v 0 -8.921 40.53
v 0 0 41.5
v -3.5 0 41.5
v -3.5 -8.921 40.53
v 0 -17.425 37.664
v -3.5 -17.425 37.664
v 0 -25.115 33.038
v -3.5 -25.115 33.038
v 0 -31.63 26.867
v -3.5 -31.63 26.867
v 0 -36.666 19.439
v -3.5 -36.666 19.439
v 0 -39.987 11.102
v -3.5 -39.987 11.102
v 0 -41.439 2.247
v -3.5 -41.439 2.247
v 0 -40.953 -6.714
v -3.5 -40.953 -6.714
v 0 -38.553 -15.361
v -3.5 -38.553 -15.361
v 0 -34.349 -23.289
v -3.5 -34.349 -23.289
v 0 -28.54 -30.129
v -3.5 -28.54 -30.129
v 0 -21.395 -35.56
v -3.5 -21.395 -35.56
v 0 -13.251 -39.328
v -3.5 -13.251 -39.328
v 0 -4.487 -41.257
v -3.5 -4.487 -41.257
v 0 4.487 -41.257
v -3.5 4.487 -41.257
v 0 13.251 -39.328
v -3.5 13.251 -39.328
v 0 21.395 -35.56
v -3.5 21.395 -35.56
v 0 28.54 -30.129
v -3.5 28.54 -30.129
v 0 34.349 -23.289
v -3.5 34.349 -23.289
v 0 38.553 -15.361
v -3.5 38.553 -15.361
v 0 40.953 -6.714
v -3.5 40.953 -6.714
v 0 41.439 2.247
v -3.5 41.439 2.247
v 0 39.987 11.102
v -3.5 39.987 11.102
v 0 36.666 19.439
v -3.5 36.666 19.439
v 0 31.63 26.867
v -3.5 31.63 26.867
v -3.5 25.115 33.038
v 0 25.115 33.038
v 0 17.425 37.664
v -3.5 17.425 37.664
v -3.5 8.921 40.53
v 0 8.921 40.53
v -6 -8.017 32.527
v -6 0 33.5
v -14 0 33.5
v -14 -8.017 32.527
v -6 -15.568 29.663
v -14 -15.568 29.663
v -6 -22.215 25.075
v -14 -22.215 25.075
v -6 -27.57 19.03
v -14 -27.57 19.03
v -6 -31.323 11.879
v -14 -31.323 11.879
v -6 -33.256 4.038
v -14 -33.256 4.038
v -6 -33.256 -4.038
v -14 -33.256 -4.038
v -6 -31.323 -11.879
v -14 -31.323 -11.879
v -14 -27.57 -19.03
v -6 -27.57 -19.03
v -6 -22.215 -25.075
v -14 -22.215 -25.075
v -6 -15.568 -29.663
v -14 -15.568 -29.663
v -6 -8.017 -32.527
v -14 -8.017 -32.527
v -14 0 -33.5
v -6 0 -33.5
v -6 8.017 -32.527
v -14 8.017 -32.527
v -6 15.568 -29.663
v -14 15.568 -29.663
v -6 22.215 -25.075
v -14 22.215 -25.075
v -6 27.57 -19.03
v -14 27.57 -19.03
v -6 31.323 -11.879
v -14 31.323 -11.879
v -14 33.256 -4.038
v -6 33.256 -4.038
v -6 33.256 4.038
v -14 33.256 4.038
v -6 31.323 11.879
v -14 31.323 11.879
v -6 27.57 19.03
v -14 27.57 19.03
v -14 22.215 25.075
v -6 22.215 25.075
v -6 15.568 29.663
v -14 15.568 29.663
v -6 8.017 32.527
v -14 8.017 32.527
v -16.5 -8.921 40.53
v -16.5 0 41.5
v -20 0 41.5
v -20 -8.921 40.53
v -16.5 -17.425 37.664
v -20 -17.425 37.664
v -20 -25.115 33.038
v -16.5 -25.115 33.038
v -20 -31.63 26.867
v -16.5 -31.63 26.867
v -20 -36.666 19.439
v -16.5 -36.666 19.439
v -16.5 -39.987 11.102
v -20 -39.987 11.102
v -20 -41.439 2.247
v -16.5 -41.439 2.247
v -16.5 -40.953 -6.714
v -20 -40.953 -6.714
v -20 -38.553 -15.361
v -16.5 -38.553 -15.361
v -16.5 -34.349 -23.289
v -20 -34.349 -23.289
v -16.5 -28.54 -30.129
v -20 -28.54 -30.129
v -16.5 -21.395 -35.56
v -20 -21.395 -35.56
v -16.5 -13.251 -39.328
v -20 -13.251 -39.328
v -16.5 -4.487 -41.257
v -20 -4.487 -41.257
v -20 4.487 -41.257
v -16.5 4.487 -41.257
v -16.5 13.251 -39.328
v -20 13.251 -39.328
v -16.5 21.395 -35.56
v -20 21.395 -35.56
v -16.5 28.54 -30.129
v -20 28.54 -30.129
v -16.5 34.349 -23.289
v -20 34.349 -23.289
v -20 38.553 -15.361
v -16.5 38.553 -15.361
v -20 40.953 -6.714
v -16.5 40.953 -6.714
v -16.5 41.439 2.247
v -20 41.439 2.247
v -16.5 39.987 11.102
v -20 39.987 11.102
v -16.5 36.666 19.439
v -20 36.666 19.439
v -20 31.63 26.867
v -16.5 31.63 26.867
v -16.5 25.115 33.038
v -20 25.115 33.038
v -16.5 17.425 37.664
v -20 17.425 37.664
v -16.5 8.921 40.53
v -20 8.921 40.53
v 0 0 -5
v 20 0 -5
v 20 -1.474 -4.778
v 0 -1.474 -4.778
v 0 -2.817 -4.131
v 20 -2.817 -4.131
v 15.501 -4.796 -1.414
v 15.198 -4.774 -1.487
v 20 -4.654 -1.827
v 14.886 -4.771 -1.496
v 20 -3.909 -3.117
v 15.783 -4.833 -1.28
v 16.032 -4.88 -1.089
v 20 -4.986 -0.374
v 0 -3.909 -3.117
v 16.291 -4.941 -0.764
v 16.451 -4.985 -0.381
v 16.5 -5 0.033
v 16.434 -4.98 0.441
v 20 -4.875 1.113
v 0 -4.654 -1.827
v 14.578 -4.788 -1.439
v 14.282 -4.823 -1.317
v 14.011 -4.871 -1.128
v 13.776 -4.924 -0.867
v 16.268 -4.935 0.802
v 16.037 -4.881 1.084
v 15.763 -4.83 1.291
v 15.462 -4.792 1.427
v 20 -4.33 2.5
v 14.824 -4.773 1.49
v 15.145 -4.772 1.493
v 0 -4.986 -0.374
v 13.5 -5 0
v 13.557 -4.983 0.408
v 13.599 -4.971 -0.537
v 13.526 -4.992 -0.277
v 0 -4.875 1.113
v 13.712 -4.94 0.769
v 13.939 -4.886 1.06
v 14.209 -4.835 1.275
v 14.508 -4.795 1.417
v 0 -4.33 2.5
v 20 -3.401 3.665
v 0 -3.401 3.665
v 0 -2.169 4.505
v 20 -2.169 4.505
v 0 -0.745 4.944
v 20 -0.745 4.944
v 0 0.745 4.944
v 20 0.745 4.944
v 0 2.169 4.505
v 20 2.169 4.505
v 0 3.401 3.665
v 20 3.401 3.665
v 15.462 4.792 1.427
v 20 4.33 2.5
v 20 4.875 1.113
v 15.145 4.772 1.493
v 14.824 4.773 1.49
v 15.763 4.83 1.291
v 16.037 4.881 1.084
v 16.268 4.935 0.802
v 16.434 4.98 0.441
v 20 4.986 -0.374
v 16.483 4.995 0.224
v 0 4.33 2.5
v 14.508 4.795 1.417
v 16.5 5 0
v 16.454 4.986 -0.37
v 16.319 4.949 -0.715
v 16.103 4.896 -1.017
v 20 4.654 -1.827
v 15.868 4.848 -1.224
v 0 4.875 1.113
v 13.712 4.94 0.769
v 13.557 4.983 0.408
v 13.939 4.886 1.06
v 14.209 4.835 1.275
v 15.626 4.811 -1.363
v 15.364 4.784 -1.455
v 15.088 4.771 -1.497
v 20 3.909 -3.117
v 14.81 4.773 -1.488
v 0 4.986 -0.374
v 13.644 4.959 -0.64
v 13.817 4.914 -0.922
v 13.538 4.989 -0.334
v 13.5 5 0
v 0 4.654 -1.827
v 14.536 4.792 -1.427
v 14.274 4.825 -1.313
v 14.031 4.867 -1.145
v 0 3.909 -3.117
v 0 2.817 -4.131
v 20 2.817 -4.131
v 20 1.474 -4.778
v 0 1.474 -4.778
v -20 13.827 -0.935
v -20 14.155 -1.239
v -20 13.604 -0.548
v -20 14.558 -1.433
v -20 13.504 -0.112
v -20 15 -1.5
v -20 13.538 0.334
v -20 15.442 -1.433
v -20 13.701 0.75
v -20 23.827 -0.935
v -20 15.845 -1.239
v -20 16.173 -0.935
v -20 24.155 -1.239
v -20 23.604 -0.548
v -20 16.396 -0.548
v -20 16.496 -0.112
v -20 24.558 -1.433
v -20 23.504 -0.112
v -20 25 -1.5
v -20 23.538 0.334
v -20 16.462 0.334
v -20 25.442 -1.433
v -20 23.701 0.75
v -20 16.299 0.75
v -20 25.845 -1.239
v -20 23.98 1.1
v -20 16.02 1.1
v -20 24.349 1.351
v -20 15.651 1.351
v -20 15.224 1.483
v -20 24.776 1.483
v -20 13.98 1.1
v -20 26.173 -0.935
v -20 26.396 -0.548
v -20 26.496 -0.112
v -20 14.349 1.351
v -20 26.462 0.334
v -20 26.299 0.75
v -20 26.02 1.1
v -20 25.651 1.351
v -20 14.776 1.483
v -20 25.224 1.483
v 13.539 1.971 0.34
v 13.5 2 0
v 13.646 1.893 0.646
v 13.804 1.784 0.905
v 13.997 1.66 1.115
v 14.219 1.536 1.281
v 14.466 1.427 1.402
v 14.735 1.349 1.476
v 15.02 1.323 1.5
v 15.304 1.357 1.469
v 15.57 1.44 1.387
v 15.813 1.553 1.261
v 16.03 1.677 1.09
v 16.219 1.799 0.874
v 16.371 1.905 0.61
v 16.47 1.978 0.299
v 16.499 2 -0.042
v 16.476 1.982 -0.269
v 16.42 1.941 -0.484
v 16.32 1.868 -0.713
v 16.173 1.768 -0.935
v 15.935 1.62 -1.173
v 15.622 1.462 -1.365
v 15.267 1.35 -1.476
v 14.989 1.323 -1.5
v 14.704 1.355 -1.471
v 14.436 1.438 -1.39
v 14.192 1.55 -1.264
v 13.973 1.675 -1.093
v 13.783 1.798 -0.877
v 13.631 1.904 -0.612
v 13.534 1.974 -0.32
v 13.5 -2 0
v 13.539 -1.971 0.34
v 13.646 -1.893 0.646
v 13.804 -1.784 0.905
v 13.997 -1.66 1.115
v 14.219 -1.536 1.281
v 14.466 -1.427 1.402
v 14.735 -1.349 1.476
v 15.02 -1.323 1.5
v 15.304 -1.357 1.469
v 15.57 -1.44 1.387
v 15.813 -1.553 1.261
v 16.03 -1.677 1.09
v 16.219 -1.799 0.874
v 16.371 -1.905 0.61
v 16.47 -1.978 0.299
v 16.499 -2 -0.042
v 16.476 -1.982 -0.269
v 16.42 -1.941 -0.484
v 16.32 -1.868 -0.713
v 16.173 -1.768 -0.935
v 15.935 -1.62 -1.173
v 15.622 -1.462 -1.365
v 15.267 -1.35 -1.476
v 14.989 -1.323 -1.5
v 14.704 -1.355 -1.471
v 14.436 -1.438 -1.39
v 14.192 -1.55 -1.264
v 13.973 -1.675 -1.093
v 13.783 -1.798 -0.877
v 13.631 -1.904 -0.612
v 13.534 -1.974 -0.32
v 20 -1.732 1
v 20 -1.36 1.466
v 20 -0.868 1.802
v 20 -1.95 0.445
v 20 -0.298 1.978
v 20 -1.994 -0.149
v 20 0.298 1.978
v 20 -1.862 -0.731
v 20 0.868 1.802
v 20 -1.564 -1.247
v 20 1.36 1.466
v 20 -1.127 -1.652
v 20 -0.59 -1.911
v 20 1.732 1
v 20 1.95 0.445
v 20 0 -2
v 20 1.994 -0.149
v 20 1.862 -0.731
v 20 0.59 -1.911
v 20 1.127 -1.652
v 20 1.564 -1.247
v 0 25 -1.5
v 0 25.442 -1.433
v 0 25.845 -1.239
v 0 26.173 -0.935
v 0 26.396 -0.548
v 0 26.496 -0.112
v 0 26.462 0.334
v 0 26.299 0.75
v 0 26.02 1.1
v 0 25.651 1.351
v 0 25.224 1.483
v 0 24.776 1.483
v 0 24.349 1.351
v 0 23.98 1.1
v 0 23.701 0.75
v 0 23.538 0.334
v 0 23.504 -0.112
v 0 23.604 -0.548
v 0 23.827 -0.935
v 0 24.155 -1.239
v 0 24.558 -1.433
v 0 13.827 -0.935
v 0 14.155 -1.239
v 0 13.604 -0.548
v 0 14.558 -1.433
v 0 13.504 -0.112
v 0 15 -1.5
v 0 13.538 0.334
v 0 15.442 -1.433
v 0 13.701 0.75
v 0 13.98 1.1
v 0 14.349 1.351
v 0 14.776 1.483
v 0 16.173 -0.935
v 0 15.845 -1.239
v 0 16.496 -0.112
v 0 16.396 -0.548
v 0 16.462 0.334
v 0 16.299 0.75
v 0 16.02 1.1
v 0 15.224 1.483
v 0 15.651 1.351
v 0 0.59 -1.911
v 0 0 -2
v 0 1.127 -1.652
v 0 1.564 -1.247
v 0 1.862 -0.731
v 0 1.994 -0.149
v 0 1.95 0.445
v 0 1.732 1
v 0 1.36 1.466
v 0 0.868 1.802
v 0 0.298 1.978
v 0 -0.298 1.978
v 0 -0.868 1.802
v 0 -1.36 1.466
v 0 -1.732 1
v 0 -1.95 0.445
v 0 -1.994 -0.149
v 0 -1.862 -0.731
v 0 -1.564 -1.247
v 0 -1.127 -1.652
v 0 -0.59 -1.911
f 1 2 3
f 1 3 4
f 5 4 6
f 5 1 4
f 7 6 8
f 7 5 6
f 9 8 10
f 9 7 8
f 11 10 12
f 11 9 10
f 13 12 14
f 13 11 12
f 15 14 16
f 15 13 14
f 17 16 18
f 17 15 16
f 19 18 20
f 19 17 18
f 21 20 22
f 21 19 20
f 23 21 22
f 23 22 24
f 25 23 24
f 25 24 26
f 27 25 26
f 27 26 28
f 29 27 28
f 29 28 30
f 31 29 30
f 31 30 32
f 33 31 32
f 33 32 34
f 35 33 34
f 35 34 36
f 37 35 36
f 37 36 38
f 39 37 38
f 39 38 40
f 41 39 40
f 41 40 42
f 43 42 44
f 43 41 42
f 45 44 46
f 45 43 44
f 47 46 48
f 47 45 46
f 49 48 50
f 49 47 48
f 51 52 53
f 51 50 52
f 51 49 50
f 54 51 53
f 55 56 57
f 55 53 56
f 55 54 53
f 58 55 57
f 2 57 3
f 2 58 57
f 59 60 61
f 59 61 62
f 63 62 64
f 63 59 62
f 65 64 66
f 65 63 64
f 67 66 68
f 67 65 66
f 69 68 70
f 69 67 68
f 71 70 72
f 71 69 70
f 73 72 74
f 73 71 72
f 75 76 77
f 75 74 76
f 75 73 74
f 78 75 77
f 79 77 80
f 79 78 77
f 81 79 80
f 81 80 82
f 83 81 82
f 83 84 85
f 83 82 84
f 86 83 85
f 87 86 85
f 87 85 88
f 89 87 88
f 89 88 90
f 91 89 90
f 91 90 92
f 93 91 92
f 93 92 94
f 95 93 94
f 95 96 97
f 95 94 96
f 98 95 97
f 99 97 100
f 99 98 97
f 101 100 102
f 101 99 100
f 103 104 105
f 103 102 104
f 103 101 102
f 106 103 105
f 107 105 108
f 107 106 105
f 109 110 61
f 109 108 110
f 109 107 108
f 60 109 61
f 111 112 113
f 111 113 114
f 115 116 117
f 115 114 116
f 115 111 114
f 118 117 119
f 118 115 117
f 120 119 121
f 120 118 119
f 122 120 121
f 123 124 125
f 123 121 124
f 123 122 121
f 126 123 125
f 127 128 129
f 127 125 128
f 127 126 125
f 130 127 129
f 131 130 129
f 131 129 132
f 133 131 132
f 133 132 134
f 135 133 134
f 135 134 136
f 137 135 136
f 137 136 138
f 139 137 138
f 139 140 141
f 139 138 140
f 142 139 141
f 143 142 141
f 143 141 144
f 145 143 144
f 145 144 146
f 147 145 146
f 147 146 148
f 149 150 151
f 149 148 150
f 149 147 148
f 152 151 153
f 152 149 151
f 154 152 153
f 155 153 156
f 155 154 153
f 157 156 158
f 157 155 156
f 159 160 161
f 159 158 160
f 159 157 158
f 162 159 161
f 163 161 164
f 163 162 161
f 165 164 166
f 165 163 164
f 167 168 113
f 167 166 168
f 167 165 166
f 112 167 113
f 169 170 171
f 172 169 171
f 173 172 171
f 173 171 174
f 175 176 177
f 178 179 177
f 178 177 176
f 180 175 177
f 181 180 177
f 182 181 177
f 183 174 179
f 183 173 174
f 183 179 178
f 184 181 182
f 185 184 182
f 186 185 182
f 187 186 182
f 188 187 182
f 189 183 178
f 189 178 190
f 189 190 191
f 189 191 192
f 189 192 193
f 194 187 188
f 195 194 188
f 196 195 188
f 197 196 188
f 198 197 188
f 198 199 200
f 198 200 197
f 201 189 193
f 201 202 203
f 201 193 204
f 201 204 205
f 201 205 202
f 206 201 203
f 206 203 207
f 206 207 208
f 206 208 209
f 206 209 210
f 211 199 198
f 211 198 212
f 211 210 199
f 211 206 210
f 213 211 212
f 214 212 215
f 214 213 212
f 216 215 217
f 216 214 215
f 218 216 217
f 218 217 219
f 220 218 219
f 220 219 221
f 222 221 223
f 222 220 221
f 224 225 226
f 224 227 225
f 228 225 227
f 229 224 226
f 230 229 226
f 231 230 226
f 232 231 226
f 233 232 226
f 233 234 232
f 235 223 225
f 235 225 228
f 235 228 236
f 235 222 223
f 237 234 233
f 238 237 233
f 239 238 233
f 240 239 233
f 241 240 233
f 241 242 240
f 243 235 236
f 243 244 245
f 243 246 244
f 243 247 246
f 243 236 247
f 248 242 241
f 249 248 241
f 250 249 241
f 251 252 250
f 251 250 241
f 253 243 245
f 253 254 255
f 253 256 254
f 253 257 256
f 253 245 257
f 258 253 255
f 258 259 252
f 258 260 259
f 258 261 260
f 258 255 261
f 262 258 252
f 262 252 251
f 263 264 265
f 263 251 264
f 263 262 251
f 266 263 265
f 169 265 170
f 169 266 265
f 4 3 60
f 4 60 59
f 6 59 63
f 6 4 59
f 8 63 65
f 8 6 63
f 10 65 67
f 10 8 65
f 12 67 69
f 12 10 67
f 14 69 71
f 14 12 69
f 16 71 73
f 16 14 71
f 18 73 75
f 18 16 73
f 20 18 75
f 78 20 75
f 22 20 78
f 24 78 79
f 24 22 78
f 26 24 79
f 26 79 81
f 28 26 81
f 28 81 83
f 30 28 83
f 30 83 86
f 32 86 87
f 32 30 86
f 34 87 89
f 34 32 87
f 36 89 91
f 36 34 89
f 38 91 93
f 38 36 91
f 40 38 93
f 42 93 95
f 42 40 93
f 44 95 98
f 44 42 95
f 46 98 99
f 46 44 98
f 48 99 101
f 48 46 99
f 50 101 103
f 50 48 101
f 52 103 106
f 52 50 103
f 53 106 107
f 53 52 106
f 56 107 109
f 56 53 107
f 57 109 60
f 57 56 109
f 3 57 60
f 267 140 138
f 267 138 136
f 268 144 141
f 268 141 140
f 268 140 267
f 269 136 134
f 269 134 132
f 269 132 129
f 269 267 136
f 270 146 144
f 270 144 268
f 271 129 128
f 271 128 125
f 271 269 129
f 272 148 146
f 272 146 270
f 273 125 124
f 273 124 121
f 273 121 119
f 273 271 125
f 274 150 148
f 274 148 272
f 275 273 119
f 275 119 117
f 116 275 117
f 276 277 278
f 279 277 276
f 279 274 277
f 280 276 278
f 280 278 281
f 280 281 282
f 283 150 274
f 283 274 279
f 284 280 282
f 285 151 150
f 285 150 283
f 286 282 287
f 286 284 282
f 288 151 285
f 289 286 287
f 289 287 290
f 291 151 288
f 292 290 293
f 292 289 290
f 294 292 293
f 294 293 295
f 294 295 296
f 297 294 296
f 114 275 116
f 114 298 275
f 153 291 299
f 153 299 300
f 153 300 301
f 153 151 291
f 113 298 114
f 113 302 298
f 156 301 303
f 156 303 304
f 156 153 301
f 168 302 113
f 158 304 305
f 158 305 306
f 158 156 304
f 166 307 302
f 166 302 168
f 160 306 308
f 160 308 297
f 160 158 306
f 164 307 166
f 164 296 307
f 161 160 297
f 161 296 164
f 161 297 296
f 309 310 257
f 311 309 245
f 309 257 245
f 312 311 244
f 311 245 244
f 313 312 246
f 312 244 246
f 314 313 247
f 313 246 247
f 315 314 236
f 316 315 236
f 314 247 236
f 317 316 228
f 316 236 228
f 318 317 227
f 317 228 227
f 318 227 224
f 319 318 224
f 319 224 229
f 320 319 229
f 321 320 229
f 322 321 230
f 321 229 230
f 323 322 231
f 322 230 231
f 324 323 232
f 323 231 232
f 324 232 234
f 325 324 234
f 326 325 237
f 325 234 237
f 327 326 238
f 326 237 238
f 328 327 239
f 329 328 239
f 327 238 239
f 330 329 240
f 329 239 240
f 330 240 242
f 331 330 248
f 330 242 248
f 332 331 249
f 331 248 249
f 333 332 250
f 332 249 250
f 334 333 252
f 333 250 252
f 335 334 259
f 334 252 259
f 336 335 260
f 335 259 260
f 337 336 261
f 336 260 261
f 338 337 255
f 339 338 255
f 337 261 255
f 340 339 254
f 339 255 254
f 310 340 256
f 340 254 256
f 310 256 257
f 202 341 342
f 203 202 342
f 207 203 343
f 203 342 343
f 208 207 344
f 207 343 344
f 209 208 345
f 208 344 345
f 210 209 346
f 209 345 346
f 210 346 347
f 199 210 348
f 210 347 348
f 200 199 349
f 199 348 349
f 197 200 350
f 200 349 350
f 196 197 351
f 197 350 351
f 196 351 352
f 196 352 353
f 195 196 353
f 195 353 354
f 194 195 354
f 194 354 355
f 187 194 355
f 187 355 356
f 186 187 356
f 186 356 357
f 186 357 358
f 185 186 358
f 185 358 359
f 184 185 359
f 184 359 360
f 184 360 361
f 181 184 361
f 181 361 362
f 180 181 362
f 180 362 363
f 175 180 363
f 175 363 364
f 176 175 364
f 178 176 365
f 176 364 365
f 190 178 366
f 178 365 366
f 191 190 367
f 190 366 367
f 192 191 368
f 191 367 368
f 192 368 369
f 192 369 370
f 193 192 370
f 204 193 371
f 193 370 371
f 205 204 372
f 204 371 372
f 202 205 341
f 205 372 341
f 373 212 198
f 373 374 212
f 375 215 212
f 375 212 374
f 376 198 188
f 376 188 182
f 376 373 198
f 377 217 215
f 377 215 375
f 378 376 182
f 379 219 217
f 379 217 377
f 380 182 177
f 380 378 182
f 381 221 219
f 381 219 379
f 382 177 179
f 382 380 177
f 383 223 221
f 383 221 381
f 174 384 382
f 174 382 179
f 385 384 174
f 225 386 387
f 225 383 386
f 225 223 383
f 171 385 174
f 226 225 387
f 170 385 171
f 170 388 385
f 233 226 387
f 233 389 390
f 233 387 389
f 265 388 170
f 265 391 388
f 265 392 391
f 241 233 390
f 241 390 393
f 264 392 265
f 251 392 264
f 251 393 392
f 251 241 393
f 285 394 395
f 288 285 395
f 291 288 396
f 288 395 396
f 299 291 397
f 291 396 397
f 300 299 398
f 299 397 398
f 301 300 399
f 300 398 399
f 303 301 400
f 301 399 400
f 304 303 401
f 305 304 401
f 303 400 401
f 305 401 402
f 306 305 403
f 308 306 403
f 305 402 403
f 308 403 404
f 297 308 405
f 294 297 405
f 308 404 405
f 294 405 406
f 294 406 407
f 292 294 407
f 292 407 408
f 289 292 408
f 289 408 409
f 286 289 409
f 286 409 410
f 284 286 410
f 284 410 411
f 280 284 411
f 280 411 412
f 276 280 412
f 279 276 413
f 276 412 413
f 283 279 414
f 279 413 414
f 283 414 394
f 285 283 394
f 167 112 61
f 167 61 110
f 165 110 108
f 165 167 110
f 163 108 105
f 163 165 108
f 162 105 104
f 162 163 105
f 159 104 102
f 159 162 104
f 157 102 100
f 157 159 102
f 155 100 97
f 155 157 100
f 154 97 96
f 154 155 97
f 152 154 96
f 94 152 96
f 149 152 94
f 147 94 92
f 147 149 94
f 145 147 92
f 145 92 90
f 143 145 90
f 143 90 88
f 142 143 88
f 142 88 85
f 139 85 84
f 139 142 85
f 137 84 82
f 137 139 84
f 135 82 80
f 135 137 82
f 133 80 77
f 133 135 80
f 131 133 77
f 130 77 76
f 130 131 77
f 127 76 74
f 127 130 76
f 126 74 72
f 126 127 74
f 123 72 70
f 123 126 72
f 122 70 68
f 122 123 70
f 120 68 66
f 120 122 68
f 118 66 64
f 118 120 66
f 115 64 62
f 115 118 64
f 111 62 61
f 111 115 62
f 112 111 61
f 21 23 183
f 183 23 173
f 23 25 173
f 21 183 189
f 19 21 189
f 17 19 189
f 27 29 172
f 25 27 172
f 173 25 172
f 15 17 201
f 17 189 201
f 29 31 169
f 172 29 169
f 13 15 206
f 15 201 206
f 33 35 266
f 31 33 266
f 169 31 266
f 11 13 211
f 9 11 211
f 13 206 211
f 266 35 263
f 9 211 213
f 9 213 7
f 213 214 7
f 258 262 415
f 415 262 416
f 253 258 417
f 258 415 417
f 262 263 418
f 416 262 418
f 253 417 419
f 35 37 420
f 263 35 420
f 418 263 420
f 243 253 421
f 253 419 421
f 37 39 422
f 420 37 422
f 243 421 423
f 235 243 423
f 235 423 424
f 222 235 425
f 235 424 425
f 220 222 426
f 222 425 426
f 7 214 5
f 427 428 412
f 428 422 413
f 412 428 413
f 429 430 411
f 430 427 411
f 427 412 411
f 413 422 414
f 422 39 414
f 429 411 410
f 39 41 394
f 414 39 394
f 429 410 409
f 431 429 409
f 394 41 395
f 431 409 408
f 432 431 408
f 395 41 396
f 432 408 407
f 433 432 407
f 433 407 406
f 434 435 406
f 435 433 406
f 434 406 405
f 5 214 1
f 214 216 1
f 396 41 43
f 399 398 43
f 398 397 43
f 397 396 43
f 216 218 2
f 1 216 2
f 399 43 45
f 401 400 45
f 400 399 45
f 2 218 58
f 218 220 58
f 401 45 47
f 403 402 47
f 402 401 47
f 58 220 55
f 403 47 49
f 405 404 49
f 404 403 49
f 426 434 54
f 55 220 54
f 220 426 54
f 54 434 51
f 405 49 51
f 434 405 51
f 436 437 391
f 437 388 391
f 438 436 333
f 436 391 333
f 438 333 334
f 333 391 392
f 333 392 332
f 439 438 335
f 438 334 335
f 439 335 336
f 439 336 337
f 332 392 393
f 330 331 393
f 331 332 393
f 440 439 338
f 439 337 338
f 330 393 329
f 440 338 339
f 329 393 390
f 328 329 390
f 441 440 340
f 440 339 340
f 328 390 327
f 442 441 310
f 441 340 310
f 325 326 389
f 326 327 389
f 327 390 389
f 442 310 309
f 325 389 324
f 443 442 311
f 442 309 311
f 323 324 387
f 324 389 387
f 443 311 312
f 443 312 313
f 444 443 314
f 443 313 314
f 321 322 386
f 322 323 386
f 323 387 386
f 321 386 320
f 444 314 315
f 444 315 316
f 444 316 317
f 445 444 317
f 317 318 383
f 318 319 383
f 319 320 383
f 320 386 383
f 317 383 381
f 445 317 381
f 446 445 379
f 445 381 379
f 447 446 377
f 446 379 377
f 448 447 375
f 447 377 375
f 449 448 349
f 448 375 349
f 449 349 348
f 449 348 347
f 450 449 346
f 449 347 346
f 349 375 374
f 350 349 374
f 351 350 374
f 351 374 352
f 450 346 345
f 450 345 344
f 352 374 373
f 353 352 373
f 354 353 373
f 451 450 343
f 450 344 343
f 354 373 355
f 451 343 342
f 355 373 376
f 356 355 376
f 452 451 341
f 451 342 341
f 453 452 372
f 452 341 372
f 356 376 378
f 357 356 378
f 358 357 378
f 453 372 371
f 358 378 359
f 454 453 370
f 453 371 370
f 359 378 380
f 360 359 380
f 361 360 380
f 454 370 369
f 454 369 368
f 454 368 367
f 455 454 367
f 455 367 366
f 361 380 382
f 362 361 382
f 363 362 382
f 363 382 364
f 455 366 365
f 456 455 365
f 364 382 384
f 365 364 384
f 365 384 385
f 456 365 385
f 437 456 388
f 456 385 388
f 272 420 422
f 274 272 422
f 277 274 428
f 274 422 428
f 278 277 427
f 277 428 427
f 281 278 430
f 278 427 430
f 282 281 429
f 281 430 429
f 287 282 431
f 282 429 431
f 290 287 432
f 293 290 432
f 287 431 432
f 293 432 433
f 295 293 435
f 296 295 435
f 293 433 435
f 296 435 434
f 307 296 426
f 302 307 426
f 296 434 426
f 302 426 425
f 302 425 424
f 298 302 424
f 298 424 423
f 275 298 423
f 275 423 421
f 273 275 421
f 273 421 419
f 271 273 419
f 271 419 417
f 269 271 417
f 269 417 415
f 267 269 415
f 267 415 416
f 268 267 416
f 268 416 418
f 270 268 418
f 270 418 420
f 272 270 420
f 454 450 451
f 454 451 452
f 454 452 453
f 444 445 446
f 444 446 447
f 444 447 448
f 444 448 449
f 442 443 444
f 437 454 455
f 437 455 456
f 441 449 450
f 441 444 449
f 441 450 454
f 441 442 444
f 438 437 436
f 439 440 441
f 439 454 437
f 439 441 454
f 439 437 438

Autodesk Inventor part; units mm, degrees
ref_plane "YZ Plane" through (0, 0, 0) normal (1, 0, 0) x (0, 1, 0)
sketch "Эскиз1" plane through (0, 0, 0) normal (0, 1, 0) x (-1, 0, 0)
  line L0 (0, 0) -> (20, 0)
  line L1 (20, 0) -> (20, 41.5)
  line L2 (20, 41.5) -> (0, 41.5)
  line L3 (0, 41.5) -> (0, 0)
  line L4 (20, 41.5) -> (14, 41.5)
  line L5 (14, 41.5) -> (14, 33.5)
  line L6 (14, 33.5) -> (6, 33.5)
  line L7 (6, 33.5) -> (6, 41.5)
  line L8 (10, 33.5) -> (10, 41.5)
  line L9 (10, 41.5) -> (3.5, 41.5)
  line L10 (3.5, 41.5) -> (6, 33.5)
  line L11 (10, 41.5) -> (16.5, 41.5)
  line L12 (16.5, 41.5) -> (14, 33.5)
  dimension "d0" = 20
  dimension "d1" = 41.5
  dimension "d2" = 6
  dimension "d3" = 8
  dimension "d4" = 8
  dimension "d38" = 6.5
  dimension "d39" = 6.5
revolve "Вращение1" add sketch "Эскиз1" angle 360 about axis through (0, 0, 0) along (-1, 0, 0) contours L3 L2 L10 L6 L12 L1 L0
sketch "Эскиз2" plane through (0, 0, 0) normal (1, 0, 0) x (0, 0, -1)
  circle A0 centre (0, 0) radius 5
  dimension "d6" = 10
extrude "Выдавливание1" add sketch "Эскиз2" along normal blind 20
sketch "Эскиз3" plane through (20, 0, 0) normal (1, 0, 0) x (0, 0, -1)
  circle A0 centre (0, 0) radius 2
  dimension "d9" = 4
extrude "Выдавливание2" cut sketch "Эскиз3" against normal blind 20
sketch "Эскиз4" plane through (0, 0, 0) normal (1, 0, 0) x (0, 0, -1)
  circle A0 centre (0, 0) radius 5 projected
  point P0 (0, 5)
ref_plane "РабПлоскость1" through (0, 5, 0) normal (0, 1, 0) x (-1, 0, 0)
sketch "Эскиз5" plane through (0, 5, 0) normal (0, 1, 0) x (-1, 0, 0)
  line L0 (0, 0) -> (-15, 0)
  circle A0 centre (-15, 0) radius 1.5
  dimension "d18" = 15
  dimension "d19" = 3
extrude "Выдавливание3" cut sketch "Эскиз5" against normal blind 58
thread "Резьба1" size "M3x0.5" class "6H" standard "ISO Metric profile" full length
ref_plane "РабПлоскость2" through (-10, 0, 0) normal (-1, 0, 0) x (0, 0, 1)
sketch "Эскиз6" plane through (0, 0, 0) normal (1, 0, 0) x (0, 0, -1)
  circle A0 centre (0, 0) radius 5 projected
  line L0 (0, 0) -> (0, 25)
  circle A1 centre (0, 25) radius 1.5
  line L1 (0, 0) -> (0, 15)
  circle A2 centre (0, 15) radius 1.5
  dimension "d28" = 25
  dimension "d29" = 3
  dimension "d42" = 15
  dimension "d43" = 3
extrude "Выдавливание4" cut sketch "Эскиз6" against normal blind 59.75 contours A1 | A2 L0 | L0 A2
thread "Резьба2" size "M3x0.5" class "6H" standard "ANSI Metric M Profile" full length
thread "Резьба3" size "M3x0.5" class "6H" standard "ANSI Metric M Profile" full length
properties part number "17701729.303661.005"
